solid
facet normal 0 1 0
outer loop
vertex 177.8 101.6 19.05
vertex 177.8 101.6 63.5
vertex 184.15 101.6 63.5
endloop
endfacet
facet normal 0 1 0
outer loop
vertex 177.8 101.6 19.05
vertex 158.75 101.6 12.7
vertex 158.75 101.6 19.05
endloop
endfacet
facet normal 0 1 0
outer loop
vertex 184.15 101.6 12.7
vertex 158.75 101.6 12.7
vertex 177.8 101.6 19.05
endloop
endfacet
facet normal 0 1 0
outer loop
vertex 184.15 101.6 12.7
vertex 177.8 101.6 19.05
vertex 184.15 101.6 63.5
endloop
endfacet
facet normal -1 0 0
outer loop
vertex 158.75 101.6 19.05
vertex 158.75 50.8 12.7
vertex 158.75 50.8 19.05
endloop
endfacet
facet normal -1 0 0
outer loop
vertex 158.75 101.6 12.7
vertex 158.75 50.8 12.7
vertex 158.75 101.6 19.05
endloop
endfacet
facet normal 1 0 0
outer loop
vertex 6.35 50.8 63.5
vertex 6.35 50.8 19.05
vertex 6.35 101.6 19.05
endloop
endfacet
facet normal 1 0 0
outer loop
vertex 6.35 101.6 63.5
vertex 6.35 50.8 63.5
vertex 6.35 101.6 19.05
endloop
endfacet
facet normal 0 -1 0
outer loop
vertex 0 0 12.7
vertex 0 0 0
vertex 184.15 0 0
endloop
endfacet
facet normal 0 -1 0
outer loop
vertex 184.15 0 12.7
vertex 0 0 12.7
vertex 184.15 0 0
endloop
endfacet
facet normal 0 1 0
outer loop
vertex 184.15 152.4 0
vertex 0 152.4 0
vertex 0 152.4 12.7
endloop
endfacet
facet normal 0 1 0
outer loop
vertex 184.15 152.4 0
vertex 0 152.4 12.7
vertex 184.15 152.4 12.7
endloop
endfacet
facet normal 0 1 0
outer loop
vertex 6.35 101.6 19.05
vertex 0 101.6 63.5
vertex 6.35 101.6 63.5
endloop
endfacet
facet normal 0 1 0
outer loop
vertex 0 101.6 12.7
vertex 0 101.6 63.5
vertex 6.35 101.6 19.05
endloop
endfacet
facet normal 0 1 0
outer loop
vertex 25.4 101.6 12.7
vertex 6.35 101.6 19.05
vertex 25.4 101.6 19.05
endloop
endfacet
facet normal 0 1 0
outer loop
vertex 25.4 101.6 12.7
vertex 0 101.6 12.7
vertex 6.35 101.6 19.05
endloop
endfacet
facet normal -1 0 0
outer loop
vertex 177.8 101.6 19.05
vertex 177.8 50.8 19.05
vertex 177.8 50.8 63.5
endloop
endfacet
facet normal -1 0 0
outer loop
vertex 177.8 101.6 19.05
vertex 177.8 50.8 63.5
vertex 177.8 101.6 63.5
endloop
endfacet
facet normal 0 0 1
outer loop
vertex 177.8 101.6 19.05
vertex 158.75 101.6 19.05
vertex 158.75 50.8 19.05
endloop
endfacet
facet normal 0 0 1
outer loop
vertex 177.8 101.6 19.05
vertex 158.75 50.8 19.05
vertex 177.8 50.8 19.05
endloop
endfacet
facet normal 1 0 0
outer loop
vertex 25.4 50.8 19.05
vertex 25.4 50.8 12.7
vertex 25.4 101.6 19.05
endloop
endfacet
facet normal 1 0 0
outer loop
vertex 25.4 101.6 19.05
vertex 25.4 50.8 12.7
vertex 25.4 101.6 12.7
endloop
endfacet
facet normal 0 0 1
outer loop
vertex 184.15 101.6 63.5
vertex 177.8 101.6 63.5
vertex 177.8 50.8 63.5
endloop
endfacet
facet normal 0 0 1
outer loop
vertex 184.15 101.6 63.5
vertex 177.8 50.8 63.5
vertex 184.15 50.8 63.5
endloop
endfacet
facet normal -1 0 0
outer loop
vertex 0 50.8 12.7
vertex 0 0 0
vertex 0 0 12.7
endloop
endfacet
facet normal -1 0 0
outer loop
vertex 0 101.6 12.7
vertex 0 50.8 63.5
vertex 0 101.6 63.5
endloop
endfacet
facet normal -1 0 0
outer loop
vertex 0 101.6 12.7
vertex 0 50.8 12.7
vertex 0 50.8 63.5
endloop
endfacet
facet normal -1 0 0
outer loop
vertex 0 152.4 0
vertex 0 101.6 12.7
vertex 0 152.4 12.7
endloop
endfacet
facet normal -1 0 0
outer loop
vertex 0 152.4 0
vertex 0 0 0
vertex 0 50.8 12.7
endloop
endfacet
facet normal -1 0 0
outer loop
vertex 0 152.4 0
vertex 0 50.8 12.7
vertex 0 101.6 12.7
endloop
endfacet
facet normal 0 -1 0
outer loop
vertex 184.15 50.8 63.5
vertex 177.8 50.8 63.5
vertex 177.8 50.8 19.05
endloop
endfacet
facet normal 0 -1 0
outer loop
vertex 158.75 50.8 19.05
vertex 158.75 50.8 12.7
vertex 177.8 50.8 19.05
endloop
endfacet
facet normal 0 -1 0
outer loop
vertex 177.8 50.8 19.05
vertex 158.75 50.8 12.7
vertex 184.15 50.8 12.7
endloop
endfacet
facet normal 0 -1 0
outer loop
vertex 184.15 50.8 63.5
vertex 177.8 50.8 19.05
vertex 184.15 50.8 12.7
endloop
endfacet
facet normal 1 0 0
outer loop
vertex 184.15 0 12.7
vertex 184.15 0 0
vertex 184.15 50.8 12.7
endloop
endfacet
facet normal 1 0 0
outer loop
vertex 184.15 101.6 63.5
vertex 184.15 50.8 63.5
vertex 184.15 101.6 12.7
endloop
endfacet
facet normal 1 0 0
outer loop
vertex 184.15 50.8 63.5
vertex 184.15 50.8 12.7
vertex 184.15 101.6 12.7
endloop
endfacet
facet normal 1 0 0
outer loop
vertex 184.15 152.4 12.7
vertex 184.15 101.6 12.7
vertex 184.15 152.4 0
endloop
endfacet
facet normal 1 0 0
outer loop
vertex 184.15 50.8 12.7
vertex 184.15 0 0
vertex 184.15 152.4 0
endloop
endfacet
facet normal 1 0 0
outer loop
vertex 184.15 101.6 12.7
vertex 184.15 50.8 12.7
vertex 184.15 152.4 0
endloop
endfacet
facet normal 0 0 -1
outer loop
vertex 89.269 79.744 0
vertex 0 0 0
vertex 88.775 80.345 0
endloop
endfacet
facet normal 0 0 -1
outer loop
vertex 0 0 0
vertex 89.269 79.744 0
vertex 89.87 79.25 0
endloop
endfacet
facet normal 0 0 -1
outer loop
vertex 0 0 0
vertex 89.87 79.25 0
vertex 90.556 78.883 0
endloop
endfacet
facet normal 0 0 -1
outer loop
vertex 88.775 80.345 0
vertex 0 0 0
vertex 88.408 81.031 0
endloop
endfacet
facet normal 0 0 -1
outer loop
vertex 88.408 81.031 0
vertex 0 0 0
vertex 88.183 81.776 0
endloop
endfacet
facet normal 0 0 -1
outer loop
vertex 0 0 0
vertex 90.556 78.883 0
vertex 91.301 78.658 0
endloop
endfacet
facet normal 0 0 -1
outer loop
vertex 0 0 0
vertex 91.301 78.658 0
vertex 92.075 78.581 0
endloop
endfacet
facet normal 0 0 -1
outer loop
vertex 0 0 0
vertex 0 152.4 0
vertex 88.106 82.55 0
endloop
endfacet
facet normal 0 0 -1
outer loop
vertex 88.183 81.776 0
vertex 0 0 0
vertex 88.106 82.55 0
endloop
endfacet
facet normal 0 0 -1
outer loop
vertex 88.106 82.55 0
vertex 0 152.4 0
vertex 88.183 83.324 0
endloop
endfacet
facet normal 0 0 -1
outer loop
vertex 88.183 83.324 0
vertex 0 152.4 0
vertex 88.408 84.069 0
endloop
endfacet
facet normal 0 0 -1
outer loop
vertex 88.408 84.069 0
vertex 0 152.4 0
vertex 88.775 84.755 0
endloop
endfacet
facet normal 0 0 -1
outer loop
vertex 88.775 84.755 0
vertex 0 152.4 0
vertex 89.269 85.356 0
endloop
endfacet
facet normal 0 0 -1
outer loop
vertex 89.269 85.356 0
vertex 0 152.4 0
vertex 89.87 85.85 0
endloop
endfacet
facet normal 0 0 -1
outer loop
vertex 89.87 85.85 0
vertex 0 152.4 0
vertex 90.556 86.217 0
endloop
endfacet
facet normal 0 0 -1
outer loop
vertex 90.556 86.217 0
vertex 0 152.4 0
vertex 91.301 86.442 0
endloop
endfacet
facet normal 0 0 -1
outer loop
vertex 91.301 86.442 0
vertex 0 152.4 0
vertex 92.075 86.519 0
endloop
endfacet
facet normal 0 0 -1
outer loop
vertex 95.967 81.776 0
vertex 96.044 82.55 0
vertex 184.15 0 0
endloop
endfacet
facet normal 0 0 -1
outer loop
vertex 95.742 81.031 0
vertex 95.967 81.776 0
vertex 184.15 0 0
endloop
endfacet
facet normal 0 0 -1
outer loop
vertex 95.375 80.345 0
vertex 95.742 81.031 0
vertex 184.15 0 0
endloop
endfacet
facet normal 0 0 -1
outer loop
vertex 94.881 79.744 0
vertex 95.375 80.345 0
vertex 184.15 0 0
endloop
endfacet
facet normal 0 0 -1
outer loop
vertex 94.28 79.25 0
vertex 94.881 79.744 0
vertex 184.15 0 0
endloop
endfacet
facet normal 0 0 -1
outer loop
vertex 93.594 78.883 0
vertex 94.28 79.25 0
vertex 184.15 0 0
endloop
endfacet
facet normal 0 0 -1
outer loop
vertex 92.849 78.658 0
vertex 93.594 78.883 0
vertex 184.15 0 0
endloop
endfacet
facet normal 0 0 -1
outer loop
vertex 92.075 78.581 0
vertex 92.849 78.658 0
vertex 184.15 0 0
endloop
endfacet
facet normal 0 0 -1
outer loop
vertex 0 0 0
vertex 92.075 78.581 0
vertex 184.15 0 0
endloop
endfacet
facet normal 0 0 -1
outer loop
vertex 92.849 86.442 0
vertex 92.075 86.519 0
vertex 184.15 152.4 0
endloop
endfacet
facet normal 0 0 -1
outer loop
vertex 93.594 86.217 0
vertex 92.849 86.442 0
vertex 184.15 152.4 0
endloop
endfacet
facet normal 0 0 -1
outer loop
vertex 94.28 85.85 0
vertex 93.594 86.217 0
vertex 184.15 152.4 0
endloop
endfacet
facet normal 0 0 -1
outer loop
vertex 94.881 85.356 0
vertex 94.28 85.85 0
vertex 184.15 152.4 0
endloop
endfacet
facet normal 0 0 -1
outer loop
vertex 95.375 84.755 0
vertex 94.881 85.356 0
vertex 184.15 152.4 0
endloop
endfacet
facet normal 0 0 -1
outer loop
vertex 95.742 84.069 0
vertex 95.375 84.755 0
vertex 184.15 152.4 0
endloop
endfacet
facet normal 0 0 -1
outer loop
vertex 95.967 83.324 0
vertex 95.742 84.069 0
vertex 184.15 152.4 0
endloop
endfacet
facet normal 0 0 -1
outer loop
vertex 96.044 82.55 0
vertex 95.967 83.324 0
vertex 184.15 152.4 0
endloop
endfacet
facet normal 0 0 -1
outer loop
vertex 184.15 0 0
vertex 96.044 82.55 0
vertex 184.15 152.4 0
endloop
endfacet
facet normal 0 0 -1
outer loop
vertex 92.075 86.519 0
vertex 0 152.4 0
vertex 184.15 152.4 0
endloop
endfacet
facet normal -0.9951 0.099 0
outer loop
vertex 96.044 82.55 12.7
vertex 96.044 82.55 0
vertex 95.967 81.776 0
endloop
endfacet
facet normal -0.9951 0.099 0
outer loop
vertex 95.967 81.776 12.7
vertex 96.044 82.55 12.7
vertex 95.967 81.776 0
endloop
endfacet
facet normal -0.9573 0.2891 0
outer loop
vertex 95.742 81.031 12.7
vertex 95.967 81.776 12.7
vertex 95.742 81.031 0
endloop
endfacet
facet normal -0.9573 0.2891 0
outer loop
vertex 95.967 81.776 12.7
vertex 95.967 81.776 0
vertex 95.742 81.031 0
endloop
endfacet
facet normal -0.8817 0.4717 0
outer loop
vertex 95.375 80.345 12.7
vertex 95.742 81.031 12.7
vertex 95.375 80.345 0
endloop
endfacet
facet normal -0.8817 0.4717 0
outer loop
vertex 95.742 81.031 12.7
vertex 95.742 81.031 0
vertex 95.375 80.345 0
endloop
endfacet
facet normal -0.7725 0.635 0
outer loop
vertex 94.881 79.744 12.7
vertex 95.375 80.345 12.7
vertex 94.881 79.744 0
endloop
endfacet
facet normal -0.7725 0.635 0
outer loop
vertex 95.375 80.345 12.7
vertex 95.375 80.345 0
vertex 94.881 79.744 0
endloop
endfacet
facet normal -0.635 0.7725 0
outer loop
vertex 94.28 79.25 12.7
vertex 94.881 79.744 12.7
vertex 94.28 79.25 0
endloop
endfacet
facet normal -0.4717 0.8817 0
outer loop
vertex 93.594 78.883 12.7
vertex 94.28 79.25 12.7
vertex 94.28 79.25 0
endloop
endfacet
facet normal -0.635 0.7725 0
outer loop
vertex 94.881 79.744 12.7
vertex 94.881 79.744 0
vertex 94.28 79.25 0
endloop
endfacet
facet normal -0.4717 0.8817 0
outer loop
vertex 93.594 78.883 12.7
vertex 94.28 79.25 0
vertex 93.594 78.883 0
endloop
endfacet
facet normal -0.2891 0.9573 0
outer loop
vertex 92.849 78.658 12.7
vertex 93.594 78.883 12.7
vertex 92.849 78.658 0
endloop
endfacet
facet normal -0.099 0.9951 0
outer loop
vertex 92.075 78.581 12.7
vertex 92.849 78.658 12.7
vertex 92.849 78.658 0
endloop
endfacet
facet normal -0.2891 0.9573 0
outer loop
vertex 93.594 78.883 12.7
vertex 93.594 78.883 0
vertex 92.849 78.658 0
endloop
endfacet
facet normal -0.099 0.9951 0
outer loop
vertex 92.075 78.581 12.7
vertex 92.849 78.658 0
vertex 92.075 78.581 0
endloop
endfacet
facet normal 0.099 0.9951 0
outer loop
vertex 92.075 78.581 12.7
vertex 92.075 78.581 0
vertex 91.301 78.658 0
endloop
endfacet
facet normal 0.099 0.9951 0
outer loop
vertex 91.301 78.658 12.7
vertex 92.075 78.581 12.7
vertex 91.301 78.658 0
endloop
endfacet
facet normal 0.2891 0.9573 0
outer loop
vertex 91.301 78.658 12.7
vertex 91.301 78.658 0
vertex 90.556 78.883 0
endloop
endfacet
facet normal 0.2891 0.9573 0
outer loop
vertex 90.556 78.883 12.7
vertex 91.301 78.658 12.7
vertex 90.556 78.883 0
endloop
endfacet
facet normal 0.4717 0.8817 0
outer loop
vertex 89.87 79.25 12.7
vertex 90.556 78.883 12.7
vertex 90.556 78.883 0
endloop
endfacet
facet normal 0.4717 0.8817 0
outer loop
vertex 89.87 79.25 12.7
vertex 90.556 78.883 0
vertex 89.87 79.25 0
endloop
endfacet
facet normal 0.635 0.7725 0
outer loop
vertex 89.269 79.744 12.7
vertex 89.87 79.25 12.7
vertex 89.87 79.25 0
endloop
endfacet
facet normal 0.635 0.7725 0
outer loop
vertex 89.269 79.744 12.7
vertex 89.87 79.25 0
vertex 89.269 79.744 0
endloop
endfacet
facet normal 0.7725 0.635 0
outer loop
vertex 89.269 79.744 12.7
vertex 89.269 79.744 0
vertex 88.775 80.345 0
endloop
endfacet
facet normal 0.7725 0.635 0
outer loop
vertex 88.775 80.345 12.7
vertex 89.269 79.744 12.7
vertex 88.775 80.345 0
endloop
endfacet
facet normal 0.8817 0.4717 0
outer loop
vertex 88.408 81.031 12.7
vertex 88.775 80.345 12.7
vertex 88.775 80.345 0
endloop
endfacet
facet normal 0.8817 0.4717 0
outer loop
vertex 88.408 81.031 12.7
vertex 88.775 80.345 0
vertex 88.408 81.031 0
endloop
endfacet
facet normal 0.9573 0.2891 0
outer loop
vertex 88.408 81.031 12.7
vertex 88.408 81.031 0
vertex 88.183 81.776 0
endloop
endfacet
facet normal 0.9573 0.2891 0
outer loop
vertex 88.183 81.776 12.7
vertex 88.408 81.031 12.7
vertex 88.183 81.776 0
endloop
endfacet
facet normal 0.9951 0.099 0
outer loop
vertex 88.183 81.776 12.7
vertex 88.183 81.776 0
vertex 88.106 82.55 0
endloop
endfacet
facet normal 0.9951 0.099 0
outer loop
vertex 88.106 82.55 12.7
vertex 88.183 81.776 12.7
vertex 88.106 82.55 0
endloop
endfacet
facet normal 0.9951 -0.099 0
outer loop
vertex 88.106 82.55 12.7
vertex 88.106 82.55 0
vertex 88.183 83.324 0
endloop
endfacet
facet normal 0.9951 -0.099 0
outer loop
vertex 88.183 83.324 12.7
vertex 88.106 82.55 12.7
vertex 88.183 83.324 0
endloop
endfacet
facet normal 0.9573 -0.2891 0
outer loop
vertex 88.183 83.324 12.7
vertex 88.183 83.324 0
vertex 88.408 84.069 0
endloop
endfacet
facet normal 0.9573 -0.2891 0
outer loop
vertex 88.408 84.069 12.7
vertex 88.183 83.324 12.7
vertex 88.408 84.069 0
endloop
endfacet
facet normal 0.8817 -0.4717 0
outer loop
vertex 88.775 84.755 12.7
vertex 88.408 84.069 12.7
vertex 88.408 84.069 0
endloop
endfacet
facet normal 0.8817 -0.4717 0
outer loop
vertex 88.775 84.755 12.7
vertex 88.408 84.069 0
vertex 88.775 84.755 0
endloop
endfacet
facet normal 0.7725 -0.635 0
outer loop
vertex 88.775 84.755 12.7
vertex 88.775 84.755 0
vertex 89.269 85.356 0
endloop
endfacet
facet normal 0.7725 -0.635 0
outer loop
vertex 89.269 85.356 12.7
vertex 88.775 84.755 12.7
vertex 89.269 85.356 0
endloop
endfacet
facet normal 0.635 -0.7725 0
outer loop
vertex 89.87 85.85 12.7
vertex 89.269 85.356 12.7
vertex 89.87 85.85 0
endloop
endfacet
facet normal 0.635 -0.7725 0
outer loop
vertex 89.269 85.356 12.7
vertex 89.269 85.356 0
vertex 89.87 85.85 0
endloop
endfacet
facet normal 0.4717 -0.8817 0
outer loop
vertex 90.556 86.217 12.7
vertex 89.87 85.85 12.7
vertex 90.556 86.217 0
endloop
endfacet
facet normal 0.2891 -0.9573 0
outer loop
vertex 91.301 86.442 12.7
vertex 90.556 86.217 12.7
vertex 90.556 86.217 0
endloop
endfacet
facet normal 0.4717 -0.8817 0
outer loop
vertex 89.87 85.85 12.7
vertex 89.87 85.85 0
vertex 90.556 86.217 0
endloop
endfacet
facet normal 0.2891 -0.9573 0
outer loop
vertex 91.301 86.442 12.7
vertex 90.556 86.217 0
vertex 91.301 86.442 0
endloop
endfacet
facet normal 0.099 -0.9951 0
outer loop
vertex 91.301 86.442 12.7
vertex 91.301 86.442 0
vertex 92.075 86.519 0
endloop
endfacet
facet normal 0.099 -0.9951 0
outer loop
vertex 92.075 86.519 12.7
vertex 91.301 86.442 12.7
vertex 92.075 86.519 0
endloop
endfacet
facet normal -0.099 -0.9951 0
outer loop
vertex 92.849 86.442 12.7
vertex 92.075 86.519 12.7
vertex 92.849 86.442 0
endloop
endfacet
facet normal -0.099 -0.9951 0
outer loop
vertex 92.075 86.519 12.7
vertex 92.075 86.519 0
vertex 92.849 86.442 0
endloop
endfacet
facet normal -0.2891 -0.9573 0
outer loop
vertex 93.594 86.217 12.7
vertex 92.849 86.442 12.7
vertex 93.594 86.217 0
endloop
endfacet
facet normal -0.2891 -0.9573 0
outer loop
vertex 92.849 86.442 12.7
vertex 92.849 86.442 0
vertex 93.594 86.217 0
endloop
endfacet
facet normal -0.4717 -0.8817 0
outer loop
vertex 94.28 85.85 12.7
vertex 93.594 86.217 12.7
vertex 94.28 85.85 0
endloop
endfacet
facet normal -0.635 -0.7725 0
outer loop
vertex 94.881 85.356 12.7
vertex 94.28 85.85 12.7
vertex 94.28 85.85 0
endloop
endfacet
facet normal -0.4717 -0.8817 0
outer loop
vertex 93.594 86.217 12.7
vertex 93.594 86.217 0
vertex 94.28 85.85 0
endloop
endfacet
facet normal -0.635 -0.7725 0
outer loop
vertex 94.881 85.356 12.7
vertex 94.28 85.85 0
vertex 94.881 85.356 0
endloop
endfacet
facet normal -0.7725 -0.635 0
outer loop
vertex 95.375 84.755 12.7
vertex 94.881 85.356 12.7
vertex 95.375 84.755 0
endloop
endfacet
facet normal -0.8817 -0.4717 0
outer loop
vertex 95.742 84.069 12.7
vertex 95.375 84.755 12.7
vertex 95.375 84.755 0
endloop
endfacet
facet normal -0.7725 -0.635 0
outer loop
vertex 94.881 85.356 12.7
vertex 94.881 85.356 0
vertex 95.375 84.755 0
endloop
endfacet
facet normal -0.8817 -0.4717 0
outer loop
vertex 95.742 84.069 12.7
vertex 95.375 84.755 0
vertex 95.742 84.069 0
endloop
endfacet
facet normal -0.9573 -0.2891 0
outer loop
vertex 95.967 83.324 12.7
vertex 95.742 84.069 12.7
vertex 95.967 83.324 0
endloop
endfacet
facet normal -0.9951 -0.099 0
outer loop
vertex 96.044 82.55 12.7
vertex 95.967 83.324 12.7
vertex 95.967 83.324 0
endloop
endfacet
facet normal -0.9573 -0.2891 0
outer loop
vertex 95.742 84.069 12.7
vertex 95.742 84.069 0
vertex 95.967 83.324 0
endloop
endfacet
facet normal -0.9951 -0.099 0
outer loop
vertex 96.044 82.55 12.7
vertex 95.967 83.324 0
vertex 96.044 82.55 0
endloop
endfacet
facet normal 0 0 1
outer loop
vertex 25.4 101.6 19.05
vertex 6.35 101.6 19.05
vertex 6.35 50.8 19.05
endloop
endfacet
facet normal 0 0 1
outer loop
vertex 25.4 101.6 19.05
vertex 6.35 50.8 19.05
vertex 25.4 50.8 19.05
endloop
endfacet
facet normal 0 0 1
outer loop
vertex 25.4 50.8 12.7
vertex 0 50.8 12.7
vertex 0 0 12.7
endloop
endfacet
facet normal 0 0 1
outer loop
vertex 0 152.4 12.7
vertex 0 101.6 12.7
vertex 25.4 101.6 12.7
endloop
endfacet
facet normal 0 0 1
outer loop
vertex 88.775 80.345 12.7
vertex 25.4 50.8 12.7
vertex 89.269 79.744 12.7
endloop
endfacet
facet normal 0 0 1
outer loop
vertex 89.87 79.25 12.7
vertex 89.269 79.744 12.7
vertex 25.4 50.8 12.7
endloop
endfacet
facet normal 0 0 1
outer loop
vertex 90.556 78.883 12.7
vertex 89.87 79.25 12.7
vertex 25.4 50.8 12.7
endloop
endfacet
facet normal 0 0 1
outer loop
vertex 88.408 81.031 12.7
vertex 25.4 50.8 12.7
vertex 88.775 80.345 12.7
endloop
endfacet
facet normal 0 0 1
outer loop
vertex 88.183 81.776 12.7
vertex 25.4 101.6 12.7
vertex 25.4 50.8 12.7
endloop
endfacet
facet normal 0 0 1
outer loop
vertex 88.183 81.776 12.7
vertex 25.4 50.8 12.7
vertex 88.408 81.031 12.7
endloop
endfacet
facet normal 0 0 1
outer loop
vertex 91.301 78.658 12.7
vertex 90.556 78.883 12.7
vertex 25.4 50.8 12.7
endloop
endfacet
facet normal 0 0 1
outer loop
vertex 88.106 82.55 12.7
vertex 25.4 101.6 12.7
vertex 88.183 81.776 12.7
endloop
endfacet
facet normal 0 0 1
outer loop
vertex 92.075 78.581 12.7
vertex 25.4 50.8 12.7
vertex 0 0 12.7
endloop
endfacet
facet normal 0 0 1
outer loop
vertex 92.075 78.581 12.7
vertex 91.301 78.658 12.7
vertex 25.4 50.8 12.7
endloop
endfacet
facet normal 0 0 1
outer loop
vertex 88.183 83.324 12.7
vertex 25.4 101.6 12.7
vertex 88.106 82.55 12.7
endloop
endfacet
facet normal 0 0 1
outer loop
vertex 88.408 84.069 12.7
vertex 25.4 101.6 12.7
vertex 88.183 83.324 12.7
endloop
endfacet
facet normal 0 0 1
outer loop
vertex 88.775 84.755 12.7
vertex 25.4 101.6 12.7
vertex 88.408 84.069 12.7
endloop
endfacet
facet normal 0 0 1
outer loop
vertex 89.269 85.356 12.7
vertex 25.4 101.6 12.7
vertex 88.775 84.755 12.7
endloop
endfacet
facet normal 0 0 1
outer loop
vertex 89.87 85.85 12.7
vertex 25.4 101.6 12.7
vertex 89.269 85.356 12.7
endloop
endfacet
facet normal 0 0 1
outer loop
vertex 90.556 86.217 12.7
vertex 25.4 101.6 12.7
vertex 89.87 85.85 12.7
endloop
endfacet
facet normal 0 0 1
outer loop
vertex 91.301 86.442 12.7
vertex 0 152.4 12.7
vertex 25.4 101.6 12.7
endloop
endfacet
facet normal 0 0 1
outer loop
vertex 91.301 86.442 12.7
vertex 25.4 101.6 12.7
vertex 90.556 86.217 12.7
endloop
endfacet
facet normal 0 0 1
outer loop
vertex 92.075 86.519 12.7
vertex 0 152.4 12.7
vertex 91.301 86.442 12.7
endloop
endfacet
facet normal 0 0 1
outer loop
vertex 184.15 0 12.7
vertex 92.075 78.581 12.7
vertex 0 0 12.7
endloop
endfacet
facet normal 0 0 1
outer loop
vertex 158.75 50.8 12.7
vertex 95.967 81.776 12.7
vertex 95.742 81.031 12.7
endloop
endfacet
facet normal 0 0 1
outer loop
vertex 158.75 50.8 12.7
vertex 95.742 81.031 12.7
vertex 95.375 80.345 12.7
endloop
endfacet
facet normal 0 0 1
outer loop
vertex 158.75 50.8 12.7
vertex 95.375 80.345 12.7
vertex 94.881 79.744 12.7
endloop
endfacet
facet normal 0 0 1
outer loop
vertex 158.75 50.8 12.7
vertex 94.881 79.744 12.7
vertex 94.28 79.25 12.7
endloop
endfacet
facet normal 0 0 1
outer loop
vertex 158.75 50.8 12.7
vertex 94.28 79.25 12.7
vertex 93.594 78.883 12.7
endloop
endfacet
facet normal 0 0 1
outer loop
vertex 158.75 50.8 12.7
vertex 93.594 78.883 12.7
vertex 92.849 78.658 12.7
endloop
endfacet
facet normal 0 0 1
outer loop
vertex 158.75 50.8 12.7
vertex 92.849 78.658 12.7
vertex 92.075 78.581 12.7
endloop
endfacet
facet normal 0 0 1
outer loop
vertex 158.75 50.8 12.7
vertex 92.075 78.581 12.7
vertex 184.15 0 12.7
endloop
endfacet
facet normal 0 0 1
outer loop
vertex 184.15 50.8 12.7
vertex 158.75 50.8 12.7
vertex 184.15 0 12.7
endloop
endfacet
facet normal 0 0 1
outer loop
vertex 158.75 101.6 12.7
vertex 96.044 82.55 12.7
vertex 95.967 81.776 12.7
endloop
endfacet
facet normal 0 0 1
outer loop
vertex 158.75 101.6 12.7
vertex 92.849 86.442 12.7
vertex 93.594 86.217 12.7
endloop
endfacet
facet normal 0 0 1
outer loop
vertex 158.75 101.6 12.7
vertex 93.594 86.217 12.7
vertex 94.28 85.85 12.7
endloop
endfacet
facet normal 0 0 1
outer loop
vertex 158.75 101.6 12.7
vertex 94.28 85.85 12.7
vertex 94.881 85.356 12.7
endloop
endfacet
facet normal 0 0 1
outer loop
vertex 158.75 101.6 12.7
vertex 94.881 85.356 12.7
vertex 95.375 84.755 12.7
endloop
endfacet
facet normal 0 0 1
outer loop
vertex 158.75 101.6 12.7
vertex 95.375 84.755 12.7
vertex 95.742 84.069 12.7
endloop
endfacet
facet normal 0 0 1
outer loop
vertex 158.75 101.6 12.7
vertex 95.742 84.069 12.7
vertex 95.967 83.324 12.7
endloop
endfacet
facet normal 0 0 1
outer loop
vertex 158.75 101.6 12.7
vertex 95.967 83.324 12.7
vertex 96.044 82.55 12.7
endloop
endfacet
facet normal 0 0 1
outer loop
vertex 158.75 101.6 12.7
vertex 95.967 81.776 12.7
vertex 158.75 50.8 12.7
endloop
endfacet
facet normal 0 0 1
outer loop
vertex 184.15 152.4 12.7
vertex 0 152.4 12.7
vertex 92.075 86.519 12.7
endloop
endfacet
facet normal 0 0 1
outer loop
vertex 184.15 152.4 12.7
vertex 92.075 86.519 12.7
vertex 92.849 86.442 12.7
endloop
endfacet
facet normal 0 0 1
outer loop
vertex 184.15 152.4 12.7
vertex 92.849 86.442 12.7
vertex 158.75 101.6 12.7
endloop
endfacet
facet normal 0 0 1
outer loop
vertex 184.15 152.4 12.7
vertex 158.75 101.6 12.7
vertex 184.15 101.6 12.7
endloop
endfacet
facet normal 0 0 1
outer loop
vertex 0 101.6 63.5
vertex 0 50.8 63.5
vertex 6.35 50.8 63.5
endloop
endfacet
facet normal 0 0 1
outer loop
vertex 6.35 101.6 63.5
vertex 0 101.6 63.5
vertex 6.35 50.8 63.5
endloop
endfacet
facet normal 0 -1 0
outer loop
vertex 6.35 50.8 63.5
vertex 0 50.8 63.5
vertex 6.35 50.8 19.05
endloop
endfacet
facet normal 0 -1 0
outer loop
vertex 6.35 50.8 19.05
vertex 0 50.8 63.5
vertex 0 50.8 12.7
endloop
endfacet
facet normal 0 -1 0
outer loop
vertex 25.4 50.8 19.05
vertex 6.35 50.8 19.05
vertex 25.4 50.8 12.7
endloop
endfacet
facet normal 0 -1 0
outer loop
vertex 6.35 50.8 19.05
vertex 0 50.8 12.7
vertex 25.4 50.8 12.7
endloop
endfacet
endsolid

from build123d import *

# Parameters (mm, degrees)
F0_W      = 184.15
F0_H      = 152.4
F1_DEPTH  = 12.7
F3_R      = 3.96875
F4_DEPTH  = 25.4
F5_W      = 25.4
F5_H      = 50.8
F6_DEPTH  = 6.35
F7_W      = 6.35
F7_H      = 50.8
F8_DEPTH  = 44.45
F9_W      = 6.35
F9_H      = 50.8
F10_DEPTH = 44.45


with BuildPart() as f1:
    # F0 (on Top) → F1 (new body)
    with BuildSketch(Plane.XY):
        with Locations((92.075, 76.2)):
            Rectangle(F0_W, F0_H)
    extrude(amount=F1_DEPTH)

    # F3 (on face) → F4 (cut)
    with BuildSketch(Plane(origin=(0, 0, 0), x_dir=(1, 0, 0), z_dir=(0, 0, -1))):
        with Locations((92.075, -82.55)):
            Circle(F3_R)
    extrude(amount=-F4_DEPTH, mode=Mode.SUBTRACT)

    # F5 (on face) → F6 (join)
    with BuildSketch(Plane.XY.offset(12.7)):
        with Locations((12.7, 76.2)):
            Rectangle(F5_W, F5_H)
        with Locations((171.45, 76.2)):
            Rectangle(F5_W, F5_H)
    extrude(amount=F6_DEPTH)

    # F7 (on face) → F8 (join)
    with BuildSketch(Plane.XY.offset(19.05)):
        with Locations((3.175, 76.2)):
            Rectangle(F7_W, F7_H)
    extrude(amount=F8_DEPTH)

    # F9 (on face) → F10 (join)
    with BuildSketch(Plane.XY.offset(19.05)):
        with Locations((180.975, 76.2)):
            Rectangle(F9_W, F9_H)
    extrude(amount=F10_DEPTH)


solid = f1.part
